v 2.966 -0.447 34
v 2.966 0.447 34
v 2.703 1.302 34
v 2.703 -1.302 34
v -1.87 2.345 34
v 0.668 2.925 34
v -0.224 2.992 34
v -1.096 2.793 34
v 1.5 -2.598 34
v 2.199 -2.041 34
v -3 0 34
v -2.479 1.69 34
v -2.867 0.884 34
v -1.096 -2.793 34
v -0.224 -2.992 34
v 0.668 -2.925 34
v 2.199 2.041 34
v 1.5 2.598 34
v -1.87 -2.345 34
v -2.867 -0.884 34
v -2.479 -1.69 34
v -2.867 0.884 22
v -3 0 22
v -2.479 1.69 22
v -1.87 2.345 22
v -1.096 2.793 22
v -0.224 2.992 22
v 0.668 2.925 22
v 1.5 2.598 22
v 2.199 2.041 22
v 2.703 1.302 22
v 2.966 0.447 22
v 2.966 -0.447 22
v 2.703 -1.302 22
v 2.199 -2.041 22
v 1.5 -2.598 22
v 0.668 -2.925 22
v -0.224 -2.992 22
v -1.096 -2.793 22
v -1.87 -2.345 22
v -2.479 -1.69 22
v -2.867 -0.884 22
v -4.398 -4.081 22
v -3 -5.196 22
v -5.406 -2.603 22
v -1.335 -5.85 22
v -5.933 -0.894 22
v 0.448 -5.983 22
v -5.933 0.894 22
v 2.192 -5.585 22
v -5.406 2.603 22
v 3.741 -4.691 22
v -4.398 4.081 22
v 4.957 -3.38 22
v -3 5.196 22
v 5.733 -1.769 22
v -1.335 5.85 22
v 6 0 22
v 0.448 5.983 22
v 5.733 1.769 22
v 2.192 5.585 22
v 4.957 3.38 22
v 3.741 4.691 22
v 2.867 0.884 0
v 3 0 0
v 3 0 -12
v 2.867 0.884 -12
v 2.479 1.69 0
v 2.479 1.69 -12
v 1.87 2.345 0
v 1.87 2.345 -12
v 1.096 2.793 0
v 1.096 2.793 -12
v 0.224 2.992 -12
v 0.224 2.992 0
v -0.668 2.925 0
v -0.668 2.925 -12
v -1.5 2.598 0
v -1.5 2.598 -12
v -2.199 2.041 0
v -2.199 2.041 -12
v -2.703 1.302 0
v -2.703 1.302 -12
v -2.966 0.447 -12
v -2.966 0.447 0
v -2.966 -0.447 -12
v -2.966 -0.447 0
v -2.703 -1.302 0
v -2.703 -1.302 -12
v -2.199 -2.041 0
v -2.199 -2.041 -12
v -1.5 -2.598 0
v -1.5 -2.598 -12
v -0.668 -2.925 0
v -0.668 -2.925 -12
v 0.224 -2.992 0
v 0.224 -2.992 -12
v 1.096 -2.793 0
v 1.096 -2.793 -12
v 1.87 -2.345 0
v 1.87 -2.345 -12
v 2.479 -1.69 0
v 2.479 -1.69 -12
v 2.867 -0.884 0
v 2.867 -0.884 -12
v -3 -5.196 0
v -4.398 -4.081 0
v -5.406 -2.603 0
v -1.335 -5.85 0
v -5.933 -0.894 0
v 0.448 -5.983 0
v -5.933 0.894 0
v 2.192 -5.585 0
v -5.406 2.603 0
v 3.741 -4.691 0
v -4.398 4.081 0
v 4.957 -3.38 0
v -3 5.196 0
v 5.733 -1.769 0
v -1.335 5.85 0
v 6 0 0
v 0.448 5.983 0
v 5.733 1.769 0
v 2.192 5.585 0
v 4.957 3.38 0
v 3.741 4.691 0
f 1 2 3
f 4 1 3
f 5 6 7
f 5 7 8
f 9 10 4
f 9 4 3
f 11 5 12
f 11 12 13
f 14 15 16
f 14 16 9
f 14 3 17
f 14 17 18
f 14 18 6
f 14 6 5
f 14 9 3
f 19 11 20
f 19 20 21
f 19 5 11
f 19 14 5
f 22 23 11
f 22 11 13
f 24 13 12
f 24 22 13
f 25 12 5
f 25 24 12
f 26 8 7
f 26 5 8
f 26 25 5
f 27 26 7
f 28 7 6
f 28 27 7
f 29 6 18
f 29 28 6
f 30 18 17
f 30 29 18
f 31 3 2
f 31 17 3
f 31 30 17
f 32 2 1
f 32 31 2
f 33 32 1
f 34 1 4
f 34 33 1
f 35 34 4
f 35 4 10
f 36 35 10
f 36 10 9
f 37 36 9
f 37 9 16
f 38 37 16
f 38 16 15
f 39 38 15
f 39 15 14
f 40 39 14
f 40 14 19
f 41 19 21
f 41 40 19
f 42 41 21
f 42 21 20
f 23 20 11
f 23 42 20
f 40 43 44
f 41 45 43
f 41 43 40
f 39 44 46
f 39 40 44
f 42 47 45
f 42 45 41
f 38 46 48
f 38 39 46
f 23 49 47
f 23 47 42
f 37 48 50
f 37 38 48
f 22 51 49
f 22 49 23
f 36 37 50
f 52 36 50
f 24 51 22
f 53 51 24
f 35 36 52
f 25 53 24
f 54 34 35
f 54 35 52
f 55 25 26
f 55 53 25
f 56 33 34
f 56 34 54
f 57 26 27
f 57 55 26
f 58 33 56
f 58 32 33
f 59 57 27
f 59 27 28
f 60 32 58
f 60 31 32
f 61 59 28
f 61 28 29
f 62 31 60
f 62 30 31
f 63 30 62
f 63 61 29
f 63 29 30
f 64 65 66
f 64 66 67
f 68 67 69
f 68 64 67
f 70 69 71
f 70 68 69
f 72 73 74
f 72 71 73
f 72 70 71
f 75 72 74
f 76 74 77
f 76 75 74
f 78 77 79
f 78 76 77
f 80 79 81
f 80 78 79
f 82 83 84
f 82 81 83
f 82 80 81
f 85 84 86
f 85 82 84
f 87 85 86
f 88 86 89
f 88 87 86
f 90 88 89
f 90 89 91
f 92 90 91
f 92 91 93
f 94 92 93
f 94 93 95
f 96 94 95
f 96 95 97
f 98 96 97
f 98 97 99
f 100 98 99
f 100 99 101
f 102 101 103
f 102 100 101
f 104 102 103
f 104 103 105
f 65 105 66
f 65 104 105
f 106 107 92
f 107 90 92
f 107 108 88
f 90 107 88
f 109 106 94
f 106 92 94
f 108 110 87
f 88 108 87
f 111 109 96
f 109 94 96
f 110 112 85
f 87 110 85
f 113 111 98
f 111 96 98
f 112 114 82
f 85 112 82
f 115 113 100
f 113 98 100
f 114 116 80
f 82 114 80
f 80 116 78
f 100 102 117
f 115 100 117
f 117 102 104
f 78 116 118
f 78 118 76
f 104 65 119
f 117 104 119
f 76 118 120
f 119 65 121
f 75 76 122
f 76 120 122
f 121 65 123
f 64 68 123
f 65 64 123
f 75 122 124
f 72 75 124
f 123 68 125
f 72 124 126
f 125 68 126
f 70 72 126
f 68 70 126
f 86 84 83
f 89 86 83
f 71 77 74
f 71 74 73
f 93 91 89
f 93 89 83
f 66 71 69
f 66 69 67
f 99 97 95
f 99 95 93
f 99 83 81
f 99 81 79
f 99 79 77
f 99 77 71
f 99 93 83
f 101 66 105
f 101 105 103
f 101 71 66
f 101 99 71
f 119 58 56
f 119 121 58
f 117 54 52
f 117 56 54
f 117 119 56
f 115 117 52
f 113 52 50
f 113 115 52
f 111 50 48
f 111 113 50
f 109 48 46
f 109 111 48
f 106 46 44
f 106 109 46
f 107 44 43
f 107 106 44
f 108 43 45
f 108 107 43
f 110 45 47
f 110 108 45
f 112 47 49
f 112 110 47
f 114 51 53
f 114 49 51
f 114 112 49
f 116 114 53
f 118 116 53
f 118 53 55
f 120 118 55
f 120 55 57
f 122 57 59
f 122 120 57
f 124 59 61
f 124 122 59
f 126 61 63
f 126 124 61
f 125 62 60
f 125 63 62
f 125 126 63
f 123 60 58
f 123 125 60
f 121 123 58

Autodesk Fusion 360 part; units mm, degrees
sketch "Esquisse1" plane through (0, 0, 0) normal (0, 0, 1) x (1, 0, 0)
  circle A0 centre (0, 0) radius 6
  dimension "d1" = 12
extrude "Extrusion1" add sketch "Esquisse1" along normal blind 22
sketch "Esquisse2" plane through (0, 0, 22) normal (0, 0, 1) x (-1, 0, 0)
  circle A0 centre (0, 0) radius 6
  circle A1 centre (0, 0) radius 3
  dimension "d4" = 6
extrude "Extrusion2" add sketch "Esquisse2" along normal blind 12 contours A1
sketch "Esquisse3" plane through (0, 0, 0) normal (0, 0, -1) x (1, 0, 0)
  circle A0 centre (0, 0) radius 6
  circle A1 centre (0, 0) radius 3
  dimension "d7" = 6
extrude "Extrusion3" add sketch "Esquisse3" along normal blind 12 contours A1
